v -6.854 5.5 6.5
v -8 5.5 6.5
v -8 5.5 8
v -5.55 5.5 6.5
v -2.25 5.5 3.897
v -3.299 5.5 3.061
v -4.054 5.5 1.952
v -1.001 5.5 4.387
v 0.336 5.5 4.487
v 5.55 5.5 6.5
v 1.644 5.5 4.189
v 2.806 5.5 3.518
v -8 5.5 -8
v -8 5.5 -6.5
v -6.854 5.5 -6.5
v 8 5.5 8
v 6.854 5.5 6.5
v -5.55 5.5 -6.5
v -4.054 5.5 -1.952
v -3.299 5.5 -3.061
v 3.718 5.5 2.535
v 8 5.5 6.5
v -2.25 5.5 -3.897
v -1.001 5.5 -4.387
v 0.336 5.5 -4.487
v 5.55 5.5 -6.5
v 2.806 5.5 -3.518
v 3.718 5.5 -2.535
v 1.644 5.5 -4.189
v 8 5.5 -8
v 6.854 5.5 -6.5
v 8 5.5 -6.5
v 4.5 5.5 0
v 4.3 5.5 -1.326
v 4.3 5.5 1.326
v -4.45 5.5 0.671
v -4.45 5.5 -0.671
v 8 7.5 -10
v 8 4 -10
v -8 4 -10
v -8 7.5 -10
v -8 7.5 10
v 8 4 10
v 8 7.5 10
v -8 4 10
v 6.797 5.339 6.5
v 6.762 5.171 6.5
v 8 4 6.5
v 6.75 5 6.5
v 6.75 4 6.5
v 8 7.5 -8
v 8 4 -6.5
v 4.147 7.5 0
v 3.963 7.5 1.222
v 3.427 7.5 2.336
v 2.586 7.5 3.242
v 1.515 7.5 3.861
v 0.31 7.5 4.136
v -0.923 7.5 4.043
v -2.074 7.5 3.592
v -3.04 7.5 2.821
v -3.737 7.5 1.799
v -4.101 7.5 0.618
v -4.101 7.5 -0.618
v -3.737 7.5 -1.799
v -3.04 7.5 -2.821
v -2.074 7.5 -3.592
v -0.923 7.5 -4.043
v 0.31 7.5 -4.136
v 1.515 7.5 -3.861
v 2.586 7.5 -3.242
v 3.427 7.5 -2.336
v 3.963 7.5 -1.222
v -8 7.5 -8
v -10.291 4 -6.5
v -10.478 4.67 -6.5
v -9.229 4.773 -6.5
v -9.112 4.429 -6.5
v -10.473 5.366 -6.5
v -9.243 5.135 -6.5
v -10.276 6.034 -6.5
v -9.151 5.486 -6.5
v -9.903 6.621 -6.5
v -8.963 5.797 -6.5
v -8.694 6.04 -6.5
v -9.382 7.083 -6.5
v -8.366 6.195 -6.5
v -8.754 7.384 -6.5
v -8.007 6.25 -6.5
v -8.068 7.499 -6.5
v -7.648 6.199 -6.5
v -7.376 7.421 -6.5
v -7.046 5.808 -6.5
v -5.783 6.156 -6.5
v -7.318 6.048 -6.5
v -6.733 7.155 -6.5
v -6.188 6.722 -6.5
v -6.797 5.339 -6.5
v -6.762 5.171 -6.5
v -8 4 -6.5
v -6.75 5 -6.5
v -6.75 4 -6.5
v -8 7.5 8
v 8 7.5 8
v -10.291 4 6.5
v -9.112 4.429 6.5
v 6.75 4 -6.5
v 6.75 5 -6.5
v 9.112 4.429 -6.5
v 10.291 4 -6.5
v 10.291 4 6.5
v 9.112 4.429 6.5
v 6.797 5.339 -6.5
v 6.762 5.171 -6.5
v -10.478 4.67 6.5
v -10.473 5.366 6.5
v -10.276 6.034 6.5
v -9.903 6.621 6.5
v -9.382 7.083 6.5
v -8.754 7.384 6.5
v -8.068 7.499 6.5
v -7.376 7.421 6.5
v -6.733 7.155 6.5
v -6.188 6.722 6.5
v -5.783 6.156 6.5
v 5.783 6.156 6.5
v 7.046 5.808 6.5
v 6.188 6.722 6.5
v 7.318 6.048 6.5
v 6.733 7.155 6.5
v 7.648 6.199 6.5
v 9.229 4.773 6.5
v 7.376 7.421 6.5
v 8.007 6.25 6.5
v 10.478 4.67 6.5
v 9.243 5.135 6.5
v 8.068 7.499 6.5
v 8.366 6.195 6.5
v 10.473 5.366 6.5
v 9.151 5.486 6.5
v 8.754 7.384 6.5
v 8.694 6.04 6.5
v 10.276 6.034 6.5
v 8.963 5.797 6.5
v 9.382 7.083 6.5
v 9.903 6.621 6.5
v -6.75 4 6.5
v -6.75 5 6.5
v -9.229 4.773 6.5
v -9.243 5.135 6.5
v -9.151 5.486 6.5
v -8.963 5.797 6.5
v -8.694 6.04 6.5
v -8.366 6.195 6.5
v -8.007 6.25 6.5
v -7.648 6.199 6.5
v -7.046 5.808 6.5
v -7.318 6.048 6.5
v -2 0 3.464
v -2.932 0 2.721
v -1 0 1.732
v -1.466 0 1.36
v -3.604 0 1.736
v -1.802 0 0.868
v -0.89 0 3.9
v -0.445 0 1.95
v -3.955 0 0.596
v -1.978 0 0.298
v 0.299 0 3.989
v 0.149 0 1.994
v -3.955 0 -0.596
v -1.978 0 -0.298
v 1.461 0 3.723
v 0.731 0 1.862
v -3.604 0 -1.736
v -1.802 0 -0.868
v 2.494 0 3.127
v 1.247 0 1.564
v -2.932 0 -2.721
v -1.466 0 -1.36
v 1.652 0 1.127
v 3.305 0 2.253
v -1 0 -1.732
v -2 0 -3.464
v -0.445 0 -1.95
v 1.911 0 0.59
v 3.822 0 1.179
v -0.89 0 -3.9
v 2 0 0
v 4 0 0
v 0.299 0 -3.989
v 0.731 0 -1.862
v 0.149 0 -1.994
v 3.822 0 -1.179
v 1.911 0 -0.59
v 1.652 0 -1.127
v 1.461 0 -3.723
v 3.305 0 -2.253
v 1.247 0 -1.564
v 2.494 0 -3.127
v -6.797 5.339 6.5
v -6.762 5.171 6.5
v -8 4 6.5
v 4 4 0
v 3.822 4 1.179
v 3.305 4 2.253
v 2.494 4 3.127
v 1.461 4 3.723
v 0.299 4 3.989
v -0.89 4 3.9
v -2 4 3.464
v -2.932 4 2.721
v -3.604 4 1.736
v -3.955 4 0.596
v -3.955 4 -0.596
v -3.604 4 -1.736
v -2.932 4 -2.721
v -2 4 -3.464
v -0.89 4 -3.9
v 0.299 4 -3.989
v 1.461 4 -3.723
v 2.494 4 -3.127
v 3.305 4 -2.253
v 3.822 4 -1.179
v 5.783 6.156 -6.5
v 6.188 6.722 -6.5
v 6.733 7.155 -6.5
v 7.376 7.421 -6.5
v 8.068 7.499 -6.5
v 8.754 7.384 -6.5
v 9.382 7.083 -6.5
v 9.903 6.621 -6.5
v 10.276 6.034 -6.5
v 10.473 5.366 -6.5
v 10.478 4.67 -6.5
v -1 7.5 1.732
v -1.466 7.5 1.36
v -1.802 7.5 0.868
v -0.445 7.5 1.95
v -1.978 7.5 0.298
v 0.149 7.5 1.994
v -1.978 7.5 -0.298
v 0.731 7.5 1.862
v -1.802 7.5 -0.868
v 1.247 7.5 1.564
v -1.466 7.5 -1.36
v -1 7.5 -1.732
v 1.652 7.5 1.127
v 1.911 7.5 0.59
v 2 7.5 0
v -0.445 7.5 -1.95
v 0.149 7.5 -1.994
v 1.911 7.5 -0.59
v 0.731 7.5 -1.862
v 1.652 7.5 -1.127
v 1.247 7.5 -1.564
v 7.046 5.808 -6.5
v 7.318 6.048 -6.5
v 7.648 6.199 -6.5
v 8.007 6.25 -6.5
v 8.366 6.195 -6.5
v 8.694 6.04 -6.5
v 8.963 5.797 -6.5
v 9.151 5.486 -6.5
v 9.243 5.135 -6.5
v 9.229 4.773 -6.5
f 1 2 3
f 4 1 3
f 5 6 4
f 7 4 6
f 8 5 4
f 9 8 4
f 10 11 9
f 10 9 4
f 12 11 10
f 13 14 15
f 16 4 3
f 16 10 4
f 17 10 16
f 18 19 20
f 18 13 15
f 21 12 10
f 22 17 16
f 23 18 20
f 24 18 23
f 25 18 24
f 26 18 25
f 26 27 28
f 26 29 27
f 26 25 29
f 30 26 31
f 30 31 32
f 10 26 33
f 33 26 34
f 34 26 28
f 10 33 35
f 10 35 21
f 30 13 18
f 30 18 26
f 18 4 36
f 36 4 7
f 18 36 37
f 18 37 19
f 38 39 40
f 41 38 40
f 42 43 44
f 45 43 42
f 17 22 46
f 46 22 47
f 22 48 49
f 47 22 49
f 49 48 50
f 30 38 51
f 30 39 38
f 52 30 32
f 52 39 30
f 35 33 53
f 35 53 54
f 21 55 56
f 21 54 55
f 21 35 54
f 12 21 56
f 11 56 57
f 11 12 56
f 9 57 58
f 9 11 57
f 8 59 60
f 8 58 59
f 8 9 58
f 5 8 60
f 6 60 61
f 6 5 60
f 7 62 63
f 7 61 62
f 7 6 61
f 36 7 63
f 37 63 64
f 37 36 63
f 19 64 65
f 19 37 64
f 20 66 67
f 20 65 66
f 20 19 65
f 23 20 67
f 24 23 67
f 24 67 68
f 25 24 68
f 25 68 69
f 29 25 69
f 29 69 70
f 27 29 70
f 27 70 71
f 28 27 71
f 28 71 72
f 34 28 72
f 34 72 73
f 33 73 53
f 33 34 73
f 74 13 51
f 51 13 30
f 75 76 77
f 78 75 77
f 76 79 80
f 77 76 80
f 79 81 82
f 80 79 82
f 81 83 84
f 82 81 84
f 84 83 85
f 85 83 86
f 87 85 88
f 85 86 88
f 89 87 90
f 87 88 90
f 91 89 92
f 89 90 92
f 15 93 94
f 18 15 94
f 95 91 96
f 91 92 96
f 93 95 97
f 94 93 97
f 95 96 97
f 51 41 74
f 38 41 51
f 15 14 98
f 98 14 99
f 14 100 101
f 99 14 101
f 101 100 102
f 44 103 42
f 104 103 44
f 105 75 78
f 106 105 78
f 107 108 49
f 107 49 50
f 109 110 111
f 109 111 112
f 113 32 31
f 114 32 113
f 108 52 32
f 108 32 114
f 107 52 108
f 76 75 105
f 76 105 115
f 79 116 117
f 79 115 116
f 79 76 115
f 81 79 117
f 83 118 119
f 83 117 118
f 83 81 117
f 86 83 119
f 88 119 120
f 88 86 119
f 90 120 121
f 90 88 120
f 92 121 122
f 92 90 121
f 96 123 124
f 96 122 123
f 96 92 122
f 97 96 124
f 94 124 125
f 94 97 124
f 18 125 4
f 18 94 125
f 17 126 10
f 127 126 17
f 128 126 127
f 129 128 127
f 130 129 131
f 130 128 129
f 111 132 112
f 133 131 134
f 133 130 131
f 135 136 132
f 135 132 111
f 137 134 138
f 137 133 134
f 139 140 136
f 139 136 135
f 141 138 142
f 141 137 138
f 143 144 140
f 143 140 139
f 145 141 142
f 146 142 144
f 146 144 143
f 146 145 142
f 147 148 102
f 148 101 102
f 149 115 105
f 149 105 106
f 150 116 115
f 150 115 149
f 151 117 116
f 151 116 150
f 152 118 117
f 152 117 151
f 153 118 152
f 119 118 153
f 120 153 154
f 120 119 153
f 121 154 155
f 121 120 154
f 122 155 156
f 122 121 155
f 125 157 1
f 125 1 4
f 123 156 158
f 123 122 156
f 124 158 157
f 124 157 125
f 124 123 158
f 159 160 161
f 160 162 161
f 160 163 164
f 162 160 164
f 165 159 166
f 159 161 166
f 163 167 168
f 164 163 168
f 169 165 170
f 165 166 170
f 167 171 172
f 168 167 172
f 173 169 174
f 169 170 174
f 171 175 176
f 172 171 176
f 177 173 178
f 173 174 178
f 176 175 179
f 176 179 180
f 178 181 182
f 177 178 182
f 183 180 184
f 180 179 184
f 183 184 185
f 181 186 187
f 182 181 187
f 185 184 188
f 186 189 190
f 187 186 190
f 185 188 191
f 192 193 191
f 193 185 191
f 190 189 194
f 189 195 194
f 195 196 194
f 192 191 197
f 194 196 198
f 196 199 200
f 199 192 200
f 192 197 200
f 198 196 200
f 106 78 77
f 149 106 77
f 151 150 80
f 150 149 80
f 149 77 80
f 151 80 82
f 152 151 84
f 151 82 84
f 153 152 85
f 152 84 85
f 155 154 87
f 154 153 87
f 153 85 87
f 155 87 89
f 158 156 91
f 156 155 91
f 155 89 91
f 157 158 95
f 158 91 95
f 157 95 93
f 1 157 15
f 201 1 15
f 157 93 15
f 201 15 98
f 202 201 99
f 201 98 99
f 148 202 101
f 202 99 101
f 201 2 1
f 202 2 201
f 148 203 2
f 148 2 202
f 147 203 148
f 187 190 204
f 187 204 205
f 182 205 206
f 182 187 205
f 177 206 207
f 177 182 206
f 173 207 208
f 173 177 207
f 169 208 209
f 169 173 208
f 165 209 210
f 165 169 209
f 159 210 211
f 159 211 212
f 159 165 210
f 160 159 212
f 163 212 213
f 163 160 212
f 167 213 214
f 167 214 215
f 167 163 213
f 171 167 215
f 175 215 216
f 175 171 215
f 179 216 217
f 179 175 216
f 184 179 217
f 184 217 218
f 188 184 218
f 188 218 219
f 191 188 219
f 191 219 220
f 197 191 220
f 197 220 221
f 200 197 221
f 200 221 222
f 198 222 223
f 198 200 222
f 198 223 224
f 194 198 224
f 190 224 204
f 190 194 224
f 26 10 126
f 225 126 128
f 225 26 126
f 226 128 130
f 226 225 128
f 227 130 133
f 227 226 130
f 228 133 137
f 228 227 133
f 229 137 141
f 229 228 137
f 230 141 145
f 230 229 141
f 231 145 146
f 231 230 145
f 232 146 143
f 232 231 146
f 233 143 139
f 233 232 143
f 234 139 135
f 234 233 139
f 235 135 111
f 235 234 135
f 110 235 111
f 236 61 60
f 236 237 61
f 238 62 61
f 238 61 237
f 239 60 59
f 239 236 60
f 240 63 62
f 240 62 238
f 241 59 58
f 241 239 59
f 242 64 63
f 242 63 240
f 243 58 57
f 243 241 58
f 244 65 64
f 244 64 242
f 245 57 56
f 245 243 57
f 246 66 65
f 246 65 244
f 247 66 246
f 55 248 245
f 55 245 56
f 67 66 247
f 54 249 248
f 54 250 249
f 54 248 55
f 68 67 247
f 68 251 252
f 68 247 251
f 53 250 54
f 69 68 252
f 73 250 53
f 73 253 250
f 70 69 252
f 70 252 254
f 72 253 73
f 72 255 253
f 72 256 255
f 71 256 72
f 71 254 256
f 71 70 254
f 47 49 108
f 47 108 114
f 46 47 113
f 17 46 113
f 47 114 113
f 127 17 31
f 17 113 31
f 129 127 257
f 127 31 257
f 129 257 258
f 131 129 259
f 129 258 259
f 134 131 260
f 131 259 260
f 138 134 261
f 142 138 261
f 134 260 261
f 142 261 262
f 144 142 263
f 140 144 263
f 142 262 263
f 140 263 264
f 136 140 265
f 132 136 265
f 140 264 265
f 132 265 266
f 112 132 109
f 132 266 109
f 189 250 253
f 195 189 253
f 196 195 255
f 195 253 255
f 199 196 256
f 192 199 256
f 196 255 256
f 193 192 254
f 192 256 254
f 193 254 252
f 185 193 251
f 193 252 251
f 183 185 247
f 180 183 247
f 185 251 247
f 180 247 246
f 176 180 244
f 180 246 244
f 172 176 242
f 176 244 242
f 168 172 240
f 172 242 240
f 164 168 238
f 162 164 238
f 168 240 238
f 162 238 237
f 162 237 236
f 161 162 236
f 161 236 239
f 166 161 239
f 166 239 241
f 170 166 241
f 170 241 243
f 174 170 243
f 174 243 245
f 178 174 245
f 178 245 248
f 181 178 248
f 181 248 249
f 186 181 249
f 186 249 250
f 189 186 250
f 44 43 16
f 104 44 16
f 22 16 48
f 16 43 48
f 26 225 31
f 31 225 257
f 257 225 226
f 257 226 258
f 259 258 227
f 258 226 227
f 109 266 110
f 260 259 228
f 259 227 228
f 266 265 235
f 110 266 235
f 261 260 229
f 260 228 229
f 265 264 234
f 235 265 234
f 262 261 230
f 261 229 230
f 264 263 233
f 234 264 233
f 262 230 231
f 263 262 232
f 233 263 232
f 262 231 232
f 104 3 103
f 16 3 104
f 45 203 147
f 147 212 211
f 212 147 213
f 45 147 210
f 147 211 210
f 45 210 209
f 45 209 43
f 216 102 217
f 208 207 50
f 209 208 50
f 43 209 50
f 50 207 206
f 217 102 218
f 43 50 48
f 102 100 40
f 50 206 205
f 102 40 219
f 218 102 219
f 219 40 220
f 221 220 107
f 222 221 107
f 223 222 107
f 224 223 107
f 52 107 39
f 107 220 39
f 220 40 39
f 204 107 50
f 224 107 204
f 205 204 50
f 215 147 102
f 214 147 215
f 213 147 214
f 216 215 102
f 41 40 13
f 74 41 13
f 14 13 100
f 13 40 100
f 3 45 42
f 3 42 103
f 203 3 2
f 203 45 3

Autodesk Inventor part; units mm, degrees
ref_plane "YZ Plane" through (0, 0, 0) normal (1, 0, 0) x (0, 1, 0)
ref_plane "XZ Plane" through (0, 0, 0) normal (0, 1, 0) x (-1, 0, 0)
ref_plane "XY Plane" through (0, 0, 0) normal (0, 0, 1) x (1, 0, 0)
sketch "Sketch2" plane through (0, 0, 0) normal (0, 0, 1) x (1, 0, 0)
  line L0 (0, 0) -> (0, 8.3073) construction
  line L1 (2, 0) -> (2, 7.5)
  line L2 (2, 7.5) -> (4.1473, 7.5)
  line L3 (4.1473, 7.5) -> (4.5, 5.5)
  line L4 (4.5, 5.5) -> (4.5, 4)
  line L5 (4.5, 4) -> (4, 4)
  line L6 (4, 4) -> (4, 0)
  line L7 (4, 0) -> (2, 0)
  dimension "d1" = 4
  dimension "d2" = 7.5
  dimension "d3" = 3.5
  dimension "d4" = 10
  dimension "d5" = 8
  dimension "d6" = 9
  dimension "d7" = 2
revolve "Revolution1" add sketch "Sketch2" angle 360 about axis through (0, 0, 0) along (0, 1, 0)
sketch "Sketch3" plane through (0, 0, 0) normal (0, 0, 1) x (1, 0, 0)
  line L0 (0, 0) -> (0, 7.5)
  line L1 (-4.1473, 7.5) -> (4.1473, 7.5) projected
  circle A0 centre (-8, 5) radius 1.25
  circle A1 centre (-8, 5) radius 2.5
  line L2 (-4.5, 4) -> (4.5, 4) projected
  line L3 (-7.25, 4) -> (-4.5, 4)
  line L4 (-4.5, 5.5) -> (-4.5, 4) projected
  line L5 (-4.5, 5.5) -> (-5.5505, 5.5)
  circle A2 centre (8, 5) radius 1.25
  circle A3 centre (8, 5) radius 2.5
  line L6 (7.25, 4) -> (4.5, 4)
  line L7 (4.5, 5.5) -> (5.5505, 5.5)
  line L8 (-10.2913, 4) -> (-9.1121, 4.4292)
  line L9 (-8, 5) -> (-8, -2.6119) construction
  line L10 (-4.5, 5.5) -> (-2.8248, 5.5)
  line L11 (-4.5, 5.5) -> (4.5, 5.5) projected
  line L12 (-2.8248, 4) -> (-2.8248, 5.5)
  line L13 (4.5, 5.5) -> (2.7431, 5.5)
  line L14 (2.7431, 5.5) -> (2.7431, 4)
  line L15 (10.2913, 4) -> (9.1121, 4.4292)
  line L16 (-6.75, 5) -> (-6.75, 4)
  line L17 (6.75, 5) -> (6.75, 4)
  dimension "d9" = 5
  dimension "d10" = 2.5
  dimension "d11" = 16
  dimension "d12" = 70
extrude "Extrusion1" add sketch "Sketch3" along normal mid plane 13 contours L2 L4 L10 L12 | L14 L11 L7 A3 L6 L2 | L3 A1 L5 L4 | L3 L16 A0 L8 A1 | A3 L15 A2 L17 L6
sketch "Sketch4" plane through (2.7431, 4, -6.5) normal (0, -1, 0) x (1, 0, 0)
  line L0 (-9.4931, 0) -> (-9.4931, 13) projected
  line L1 (4.0069, 13) -> (4.0069, 0) projected
  line L2 (5.2569, -3.5) -> (-10.7431, -3.5)
  line L3 (-2.7431, -3.5) -> (-2.7431, 6.5)
  line L4 (5.2569, -3.5) -> (5.2569, 0)
  line L5 (0, 0) -> (2.8074, 0) projected
  line L6 (5.2569, 0) -> (0, 0)
  line L7 (0, 0) -> (0, 2.8945)
  arc A0 (-5.5678, 2.997) -> (0, 2.9327) centre (-2.7431, 6.5) ccw projected
  line L8 (-10.7431, -3.5) -> (-10.7431, 0)
  line L9 (-8.2936, 0) -> (-5.5678, 0) projected
  line L10 (-10.7431, 0) -> (-5.5678, 0)
  line L11 (-5.5678, 0) -> (-5.5678, 2.997) projected
  line L12 (-5.5678, 0) -> (-5.5678, 2.997)
  line L13 (-2.7431, 6.5) -> (4.0069, 6.5)
  line L14 (5.2569, 16.5) -> (-10.7431, 16.5)
  line L15 (5.2569, 16.5) -> (5.2569, 13)
  line L16 (0, 13) -> (2.8074, 13)
  line L17 (5.2569, 13) -> (0, 13)
  line L18 (0, 13) -> (0, 10.1055)
  arc A1 (0, 10.0673) -> (-5.5678, 10.003) centre (-2.7431, 6.5) ccw
  line L19 (-10.7431, 16.5) -> (-10.7431, 13)
  line L20 (-8.2936, 13) -> (-5.5678, 13)
  line L21 (-10.7431, 13) -> (-5.5678, 13)
  line L22 (-5.5678, 13) -> (-5.5678, 10.003)
  line L23 (-5.5678, 13) -> (-5.5678, 10.003)
  arc A2 (0, 2.9327) -> (0, 10.0673) centre (-2.7431, 6.5) ccw projected
  arc A3 (-5.5678, 10.003) -> (-5.5678, 2.997) centre (-2.7431, 6.5) ccw projected
  point P0 (-2.7431, 16.5)
  dimension "d15" = 16
  dimension "d21" = 20
extrude "Extrusion2" add sketch "Sketch4" against normal up to surface (1.5 mm away) contours L10 L9 L11 A0 L3 L2 L8 | L21 L19 L14 L15 L17 L1 L13 A2 A1 L22 L20 | L3 A0 A2 L13 L1 L6 L4 L2
sketch "Sketch5" plane through (5.5505, 5.5, 6.5) normal (0, 1, 0) x (1, 0, 0)
  line L0 (-5.5505, 6.5) -> (4.9752, 6.5)
  line L1 (-13.5505, 16.5) -> (2.4495, 16.5) projected
  line L2 (2.4495, 16.5) -> (-13.5505, 16.5)
  line L3 (-13.5505, 16.5) -> (-13.5505, 14.5)
  line L4 (-13.5505, 14.5) -> (2.4495, 14.5)
  line L5 (2.4495, 14.5) -> (2.4495, 16.5)
  line L6 (-13.5505, -3.5) -> (2.4495, -3.5)
  line L7 (2.4495, -3.5) -> (-13.5505, -3.5)
  line L8 (-13.5505, -3.5) -> (-13.5505, -1.5)
  line L9 (-13.5505, -1.5) -> (2.4495, -1.5)
  line L10 (2.4495, -1.5) -> (2.4495, -3.5)
  dimension "d18" = 16
extrude "Extrusion3" add sketch "Sketch5" along normal up to surface (2 mm away)
properties part number "18102021-002-06" material "Stainless Steel"
